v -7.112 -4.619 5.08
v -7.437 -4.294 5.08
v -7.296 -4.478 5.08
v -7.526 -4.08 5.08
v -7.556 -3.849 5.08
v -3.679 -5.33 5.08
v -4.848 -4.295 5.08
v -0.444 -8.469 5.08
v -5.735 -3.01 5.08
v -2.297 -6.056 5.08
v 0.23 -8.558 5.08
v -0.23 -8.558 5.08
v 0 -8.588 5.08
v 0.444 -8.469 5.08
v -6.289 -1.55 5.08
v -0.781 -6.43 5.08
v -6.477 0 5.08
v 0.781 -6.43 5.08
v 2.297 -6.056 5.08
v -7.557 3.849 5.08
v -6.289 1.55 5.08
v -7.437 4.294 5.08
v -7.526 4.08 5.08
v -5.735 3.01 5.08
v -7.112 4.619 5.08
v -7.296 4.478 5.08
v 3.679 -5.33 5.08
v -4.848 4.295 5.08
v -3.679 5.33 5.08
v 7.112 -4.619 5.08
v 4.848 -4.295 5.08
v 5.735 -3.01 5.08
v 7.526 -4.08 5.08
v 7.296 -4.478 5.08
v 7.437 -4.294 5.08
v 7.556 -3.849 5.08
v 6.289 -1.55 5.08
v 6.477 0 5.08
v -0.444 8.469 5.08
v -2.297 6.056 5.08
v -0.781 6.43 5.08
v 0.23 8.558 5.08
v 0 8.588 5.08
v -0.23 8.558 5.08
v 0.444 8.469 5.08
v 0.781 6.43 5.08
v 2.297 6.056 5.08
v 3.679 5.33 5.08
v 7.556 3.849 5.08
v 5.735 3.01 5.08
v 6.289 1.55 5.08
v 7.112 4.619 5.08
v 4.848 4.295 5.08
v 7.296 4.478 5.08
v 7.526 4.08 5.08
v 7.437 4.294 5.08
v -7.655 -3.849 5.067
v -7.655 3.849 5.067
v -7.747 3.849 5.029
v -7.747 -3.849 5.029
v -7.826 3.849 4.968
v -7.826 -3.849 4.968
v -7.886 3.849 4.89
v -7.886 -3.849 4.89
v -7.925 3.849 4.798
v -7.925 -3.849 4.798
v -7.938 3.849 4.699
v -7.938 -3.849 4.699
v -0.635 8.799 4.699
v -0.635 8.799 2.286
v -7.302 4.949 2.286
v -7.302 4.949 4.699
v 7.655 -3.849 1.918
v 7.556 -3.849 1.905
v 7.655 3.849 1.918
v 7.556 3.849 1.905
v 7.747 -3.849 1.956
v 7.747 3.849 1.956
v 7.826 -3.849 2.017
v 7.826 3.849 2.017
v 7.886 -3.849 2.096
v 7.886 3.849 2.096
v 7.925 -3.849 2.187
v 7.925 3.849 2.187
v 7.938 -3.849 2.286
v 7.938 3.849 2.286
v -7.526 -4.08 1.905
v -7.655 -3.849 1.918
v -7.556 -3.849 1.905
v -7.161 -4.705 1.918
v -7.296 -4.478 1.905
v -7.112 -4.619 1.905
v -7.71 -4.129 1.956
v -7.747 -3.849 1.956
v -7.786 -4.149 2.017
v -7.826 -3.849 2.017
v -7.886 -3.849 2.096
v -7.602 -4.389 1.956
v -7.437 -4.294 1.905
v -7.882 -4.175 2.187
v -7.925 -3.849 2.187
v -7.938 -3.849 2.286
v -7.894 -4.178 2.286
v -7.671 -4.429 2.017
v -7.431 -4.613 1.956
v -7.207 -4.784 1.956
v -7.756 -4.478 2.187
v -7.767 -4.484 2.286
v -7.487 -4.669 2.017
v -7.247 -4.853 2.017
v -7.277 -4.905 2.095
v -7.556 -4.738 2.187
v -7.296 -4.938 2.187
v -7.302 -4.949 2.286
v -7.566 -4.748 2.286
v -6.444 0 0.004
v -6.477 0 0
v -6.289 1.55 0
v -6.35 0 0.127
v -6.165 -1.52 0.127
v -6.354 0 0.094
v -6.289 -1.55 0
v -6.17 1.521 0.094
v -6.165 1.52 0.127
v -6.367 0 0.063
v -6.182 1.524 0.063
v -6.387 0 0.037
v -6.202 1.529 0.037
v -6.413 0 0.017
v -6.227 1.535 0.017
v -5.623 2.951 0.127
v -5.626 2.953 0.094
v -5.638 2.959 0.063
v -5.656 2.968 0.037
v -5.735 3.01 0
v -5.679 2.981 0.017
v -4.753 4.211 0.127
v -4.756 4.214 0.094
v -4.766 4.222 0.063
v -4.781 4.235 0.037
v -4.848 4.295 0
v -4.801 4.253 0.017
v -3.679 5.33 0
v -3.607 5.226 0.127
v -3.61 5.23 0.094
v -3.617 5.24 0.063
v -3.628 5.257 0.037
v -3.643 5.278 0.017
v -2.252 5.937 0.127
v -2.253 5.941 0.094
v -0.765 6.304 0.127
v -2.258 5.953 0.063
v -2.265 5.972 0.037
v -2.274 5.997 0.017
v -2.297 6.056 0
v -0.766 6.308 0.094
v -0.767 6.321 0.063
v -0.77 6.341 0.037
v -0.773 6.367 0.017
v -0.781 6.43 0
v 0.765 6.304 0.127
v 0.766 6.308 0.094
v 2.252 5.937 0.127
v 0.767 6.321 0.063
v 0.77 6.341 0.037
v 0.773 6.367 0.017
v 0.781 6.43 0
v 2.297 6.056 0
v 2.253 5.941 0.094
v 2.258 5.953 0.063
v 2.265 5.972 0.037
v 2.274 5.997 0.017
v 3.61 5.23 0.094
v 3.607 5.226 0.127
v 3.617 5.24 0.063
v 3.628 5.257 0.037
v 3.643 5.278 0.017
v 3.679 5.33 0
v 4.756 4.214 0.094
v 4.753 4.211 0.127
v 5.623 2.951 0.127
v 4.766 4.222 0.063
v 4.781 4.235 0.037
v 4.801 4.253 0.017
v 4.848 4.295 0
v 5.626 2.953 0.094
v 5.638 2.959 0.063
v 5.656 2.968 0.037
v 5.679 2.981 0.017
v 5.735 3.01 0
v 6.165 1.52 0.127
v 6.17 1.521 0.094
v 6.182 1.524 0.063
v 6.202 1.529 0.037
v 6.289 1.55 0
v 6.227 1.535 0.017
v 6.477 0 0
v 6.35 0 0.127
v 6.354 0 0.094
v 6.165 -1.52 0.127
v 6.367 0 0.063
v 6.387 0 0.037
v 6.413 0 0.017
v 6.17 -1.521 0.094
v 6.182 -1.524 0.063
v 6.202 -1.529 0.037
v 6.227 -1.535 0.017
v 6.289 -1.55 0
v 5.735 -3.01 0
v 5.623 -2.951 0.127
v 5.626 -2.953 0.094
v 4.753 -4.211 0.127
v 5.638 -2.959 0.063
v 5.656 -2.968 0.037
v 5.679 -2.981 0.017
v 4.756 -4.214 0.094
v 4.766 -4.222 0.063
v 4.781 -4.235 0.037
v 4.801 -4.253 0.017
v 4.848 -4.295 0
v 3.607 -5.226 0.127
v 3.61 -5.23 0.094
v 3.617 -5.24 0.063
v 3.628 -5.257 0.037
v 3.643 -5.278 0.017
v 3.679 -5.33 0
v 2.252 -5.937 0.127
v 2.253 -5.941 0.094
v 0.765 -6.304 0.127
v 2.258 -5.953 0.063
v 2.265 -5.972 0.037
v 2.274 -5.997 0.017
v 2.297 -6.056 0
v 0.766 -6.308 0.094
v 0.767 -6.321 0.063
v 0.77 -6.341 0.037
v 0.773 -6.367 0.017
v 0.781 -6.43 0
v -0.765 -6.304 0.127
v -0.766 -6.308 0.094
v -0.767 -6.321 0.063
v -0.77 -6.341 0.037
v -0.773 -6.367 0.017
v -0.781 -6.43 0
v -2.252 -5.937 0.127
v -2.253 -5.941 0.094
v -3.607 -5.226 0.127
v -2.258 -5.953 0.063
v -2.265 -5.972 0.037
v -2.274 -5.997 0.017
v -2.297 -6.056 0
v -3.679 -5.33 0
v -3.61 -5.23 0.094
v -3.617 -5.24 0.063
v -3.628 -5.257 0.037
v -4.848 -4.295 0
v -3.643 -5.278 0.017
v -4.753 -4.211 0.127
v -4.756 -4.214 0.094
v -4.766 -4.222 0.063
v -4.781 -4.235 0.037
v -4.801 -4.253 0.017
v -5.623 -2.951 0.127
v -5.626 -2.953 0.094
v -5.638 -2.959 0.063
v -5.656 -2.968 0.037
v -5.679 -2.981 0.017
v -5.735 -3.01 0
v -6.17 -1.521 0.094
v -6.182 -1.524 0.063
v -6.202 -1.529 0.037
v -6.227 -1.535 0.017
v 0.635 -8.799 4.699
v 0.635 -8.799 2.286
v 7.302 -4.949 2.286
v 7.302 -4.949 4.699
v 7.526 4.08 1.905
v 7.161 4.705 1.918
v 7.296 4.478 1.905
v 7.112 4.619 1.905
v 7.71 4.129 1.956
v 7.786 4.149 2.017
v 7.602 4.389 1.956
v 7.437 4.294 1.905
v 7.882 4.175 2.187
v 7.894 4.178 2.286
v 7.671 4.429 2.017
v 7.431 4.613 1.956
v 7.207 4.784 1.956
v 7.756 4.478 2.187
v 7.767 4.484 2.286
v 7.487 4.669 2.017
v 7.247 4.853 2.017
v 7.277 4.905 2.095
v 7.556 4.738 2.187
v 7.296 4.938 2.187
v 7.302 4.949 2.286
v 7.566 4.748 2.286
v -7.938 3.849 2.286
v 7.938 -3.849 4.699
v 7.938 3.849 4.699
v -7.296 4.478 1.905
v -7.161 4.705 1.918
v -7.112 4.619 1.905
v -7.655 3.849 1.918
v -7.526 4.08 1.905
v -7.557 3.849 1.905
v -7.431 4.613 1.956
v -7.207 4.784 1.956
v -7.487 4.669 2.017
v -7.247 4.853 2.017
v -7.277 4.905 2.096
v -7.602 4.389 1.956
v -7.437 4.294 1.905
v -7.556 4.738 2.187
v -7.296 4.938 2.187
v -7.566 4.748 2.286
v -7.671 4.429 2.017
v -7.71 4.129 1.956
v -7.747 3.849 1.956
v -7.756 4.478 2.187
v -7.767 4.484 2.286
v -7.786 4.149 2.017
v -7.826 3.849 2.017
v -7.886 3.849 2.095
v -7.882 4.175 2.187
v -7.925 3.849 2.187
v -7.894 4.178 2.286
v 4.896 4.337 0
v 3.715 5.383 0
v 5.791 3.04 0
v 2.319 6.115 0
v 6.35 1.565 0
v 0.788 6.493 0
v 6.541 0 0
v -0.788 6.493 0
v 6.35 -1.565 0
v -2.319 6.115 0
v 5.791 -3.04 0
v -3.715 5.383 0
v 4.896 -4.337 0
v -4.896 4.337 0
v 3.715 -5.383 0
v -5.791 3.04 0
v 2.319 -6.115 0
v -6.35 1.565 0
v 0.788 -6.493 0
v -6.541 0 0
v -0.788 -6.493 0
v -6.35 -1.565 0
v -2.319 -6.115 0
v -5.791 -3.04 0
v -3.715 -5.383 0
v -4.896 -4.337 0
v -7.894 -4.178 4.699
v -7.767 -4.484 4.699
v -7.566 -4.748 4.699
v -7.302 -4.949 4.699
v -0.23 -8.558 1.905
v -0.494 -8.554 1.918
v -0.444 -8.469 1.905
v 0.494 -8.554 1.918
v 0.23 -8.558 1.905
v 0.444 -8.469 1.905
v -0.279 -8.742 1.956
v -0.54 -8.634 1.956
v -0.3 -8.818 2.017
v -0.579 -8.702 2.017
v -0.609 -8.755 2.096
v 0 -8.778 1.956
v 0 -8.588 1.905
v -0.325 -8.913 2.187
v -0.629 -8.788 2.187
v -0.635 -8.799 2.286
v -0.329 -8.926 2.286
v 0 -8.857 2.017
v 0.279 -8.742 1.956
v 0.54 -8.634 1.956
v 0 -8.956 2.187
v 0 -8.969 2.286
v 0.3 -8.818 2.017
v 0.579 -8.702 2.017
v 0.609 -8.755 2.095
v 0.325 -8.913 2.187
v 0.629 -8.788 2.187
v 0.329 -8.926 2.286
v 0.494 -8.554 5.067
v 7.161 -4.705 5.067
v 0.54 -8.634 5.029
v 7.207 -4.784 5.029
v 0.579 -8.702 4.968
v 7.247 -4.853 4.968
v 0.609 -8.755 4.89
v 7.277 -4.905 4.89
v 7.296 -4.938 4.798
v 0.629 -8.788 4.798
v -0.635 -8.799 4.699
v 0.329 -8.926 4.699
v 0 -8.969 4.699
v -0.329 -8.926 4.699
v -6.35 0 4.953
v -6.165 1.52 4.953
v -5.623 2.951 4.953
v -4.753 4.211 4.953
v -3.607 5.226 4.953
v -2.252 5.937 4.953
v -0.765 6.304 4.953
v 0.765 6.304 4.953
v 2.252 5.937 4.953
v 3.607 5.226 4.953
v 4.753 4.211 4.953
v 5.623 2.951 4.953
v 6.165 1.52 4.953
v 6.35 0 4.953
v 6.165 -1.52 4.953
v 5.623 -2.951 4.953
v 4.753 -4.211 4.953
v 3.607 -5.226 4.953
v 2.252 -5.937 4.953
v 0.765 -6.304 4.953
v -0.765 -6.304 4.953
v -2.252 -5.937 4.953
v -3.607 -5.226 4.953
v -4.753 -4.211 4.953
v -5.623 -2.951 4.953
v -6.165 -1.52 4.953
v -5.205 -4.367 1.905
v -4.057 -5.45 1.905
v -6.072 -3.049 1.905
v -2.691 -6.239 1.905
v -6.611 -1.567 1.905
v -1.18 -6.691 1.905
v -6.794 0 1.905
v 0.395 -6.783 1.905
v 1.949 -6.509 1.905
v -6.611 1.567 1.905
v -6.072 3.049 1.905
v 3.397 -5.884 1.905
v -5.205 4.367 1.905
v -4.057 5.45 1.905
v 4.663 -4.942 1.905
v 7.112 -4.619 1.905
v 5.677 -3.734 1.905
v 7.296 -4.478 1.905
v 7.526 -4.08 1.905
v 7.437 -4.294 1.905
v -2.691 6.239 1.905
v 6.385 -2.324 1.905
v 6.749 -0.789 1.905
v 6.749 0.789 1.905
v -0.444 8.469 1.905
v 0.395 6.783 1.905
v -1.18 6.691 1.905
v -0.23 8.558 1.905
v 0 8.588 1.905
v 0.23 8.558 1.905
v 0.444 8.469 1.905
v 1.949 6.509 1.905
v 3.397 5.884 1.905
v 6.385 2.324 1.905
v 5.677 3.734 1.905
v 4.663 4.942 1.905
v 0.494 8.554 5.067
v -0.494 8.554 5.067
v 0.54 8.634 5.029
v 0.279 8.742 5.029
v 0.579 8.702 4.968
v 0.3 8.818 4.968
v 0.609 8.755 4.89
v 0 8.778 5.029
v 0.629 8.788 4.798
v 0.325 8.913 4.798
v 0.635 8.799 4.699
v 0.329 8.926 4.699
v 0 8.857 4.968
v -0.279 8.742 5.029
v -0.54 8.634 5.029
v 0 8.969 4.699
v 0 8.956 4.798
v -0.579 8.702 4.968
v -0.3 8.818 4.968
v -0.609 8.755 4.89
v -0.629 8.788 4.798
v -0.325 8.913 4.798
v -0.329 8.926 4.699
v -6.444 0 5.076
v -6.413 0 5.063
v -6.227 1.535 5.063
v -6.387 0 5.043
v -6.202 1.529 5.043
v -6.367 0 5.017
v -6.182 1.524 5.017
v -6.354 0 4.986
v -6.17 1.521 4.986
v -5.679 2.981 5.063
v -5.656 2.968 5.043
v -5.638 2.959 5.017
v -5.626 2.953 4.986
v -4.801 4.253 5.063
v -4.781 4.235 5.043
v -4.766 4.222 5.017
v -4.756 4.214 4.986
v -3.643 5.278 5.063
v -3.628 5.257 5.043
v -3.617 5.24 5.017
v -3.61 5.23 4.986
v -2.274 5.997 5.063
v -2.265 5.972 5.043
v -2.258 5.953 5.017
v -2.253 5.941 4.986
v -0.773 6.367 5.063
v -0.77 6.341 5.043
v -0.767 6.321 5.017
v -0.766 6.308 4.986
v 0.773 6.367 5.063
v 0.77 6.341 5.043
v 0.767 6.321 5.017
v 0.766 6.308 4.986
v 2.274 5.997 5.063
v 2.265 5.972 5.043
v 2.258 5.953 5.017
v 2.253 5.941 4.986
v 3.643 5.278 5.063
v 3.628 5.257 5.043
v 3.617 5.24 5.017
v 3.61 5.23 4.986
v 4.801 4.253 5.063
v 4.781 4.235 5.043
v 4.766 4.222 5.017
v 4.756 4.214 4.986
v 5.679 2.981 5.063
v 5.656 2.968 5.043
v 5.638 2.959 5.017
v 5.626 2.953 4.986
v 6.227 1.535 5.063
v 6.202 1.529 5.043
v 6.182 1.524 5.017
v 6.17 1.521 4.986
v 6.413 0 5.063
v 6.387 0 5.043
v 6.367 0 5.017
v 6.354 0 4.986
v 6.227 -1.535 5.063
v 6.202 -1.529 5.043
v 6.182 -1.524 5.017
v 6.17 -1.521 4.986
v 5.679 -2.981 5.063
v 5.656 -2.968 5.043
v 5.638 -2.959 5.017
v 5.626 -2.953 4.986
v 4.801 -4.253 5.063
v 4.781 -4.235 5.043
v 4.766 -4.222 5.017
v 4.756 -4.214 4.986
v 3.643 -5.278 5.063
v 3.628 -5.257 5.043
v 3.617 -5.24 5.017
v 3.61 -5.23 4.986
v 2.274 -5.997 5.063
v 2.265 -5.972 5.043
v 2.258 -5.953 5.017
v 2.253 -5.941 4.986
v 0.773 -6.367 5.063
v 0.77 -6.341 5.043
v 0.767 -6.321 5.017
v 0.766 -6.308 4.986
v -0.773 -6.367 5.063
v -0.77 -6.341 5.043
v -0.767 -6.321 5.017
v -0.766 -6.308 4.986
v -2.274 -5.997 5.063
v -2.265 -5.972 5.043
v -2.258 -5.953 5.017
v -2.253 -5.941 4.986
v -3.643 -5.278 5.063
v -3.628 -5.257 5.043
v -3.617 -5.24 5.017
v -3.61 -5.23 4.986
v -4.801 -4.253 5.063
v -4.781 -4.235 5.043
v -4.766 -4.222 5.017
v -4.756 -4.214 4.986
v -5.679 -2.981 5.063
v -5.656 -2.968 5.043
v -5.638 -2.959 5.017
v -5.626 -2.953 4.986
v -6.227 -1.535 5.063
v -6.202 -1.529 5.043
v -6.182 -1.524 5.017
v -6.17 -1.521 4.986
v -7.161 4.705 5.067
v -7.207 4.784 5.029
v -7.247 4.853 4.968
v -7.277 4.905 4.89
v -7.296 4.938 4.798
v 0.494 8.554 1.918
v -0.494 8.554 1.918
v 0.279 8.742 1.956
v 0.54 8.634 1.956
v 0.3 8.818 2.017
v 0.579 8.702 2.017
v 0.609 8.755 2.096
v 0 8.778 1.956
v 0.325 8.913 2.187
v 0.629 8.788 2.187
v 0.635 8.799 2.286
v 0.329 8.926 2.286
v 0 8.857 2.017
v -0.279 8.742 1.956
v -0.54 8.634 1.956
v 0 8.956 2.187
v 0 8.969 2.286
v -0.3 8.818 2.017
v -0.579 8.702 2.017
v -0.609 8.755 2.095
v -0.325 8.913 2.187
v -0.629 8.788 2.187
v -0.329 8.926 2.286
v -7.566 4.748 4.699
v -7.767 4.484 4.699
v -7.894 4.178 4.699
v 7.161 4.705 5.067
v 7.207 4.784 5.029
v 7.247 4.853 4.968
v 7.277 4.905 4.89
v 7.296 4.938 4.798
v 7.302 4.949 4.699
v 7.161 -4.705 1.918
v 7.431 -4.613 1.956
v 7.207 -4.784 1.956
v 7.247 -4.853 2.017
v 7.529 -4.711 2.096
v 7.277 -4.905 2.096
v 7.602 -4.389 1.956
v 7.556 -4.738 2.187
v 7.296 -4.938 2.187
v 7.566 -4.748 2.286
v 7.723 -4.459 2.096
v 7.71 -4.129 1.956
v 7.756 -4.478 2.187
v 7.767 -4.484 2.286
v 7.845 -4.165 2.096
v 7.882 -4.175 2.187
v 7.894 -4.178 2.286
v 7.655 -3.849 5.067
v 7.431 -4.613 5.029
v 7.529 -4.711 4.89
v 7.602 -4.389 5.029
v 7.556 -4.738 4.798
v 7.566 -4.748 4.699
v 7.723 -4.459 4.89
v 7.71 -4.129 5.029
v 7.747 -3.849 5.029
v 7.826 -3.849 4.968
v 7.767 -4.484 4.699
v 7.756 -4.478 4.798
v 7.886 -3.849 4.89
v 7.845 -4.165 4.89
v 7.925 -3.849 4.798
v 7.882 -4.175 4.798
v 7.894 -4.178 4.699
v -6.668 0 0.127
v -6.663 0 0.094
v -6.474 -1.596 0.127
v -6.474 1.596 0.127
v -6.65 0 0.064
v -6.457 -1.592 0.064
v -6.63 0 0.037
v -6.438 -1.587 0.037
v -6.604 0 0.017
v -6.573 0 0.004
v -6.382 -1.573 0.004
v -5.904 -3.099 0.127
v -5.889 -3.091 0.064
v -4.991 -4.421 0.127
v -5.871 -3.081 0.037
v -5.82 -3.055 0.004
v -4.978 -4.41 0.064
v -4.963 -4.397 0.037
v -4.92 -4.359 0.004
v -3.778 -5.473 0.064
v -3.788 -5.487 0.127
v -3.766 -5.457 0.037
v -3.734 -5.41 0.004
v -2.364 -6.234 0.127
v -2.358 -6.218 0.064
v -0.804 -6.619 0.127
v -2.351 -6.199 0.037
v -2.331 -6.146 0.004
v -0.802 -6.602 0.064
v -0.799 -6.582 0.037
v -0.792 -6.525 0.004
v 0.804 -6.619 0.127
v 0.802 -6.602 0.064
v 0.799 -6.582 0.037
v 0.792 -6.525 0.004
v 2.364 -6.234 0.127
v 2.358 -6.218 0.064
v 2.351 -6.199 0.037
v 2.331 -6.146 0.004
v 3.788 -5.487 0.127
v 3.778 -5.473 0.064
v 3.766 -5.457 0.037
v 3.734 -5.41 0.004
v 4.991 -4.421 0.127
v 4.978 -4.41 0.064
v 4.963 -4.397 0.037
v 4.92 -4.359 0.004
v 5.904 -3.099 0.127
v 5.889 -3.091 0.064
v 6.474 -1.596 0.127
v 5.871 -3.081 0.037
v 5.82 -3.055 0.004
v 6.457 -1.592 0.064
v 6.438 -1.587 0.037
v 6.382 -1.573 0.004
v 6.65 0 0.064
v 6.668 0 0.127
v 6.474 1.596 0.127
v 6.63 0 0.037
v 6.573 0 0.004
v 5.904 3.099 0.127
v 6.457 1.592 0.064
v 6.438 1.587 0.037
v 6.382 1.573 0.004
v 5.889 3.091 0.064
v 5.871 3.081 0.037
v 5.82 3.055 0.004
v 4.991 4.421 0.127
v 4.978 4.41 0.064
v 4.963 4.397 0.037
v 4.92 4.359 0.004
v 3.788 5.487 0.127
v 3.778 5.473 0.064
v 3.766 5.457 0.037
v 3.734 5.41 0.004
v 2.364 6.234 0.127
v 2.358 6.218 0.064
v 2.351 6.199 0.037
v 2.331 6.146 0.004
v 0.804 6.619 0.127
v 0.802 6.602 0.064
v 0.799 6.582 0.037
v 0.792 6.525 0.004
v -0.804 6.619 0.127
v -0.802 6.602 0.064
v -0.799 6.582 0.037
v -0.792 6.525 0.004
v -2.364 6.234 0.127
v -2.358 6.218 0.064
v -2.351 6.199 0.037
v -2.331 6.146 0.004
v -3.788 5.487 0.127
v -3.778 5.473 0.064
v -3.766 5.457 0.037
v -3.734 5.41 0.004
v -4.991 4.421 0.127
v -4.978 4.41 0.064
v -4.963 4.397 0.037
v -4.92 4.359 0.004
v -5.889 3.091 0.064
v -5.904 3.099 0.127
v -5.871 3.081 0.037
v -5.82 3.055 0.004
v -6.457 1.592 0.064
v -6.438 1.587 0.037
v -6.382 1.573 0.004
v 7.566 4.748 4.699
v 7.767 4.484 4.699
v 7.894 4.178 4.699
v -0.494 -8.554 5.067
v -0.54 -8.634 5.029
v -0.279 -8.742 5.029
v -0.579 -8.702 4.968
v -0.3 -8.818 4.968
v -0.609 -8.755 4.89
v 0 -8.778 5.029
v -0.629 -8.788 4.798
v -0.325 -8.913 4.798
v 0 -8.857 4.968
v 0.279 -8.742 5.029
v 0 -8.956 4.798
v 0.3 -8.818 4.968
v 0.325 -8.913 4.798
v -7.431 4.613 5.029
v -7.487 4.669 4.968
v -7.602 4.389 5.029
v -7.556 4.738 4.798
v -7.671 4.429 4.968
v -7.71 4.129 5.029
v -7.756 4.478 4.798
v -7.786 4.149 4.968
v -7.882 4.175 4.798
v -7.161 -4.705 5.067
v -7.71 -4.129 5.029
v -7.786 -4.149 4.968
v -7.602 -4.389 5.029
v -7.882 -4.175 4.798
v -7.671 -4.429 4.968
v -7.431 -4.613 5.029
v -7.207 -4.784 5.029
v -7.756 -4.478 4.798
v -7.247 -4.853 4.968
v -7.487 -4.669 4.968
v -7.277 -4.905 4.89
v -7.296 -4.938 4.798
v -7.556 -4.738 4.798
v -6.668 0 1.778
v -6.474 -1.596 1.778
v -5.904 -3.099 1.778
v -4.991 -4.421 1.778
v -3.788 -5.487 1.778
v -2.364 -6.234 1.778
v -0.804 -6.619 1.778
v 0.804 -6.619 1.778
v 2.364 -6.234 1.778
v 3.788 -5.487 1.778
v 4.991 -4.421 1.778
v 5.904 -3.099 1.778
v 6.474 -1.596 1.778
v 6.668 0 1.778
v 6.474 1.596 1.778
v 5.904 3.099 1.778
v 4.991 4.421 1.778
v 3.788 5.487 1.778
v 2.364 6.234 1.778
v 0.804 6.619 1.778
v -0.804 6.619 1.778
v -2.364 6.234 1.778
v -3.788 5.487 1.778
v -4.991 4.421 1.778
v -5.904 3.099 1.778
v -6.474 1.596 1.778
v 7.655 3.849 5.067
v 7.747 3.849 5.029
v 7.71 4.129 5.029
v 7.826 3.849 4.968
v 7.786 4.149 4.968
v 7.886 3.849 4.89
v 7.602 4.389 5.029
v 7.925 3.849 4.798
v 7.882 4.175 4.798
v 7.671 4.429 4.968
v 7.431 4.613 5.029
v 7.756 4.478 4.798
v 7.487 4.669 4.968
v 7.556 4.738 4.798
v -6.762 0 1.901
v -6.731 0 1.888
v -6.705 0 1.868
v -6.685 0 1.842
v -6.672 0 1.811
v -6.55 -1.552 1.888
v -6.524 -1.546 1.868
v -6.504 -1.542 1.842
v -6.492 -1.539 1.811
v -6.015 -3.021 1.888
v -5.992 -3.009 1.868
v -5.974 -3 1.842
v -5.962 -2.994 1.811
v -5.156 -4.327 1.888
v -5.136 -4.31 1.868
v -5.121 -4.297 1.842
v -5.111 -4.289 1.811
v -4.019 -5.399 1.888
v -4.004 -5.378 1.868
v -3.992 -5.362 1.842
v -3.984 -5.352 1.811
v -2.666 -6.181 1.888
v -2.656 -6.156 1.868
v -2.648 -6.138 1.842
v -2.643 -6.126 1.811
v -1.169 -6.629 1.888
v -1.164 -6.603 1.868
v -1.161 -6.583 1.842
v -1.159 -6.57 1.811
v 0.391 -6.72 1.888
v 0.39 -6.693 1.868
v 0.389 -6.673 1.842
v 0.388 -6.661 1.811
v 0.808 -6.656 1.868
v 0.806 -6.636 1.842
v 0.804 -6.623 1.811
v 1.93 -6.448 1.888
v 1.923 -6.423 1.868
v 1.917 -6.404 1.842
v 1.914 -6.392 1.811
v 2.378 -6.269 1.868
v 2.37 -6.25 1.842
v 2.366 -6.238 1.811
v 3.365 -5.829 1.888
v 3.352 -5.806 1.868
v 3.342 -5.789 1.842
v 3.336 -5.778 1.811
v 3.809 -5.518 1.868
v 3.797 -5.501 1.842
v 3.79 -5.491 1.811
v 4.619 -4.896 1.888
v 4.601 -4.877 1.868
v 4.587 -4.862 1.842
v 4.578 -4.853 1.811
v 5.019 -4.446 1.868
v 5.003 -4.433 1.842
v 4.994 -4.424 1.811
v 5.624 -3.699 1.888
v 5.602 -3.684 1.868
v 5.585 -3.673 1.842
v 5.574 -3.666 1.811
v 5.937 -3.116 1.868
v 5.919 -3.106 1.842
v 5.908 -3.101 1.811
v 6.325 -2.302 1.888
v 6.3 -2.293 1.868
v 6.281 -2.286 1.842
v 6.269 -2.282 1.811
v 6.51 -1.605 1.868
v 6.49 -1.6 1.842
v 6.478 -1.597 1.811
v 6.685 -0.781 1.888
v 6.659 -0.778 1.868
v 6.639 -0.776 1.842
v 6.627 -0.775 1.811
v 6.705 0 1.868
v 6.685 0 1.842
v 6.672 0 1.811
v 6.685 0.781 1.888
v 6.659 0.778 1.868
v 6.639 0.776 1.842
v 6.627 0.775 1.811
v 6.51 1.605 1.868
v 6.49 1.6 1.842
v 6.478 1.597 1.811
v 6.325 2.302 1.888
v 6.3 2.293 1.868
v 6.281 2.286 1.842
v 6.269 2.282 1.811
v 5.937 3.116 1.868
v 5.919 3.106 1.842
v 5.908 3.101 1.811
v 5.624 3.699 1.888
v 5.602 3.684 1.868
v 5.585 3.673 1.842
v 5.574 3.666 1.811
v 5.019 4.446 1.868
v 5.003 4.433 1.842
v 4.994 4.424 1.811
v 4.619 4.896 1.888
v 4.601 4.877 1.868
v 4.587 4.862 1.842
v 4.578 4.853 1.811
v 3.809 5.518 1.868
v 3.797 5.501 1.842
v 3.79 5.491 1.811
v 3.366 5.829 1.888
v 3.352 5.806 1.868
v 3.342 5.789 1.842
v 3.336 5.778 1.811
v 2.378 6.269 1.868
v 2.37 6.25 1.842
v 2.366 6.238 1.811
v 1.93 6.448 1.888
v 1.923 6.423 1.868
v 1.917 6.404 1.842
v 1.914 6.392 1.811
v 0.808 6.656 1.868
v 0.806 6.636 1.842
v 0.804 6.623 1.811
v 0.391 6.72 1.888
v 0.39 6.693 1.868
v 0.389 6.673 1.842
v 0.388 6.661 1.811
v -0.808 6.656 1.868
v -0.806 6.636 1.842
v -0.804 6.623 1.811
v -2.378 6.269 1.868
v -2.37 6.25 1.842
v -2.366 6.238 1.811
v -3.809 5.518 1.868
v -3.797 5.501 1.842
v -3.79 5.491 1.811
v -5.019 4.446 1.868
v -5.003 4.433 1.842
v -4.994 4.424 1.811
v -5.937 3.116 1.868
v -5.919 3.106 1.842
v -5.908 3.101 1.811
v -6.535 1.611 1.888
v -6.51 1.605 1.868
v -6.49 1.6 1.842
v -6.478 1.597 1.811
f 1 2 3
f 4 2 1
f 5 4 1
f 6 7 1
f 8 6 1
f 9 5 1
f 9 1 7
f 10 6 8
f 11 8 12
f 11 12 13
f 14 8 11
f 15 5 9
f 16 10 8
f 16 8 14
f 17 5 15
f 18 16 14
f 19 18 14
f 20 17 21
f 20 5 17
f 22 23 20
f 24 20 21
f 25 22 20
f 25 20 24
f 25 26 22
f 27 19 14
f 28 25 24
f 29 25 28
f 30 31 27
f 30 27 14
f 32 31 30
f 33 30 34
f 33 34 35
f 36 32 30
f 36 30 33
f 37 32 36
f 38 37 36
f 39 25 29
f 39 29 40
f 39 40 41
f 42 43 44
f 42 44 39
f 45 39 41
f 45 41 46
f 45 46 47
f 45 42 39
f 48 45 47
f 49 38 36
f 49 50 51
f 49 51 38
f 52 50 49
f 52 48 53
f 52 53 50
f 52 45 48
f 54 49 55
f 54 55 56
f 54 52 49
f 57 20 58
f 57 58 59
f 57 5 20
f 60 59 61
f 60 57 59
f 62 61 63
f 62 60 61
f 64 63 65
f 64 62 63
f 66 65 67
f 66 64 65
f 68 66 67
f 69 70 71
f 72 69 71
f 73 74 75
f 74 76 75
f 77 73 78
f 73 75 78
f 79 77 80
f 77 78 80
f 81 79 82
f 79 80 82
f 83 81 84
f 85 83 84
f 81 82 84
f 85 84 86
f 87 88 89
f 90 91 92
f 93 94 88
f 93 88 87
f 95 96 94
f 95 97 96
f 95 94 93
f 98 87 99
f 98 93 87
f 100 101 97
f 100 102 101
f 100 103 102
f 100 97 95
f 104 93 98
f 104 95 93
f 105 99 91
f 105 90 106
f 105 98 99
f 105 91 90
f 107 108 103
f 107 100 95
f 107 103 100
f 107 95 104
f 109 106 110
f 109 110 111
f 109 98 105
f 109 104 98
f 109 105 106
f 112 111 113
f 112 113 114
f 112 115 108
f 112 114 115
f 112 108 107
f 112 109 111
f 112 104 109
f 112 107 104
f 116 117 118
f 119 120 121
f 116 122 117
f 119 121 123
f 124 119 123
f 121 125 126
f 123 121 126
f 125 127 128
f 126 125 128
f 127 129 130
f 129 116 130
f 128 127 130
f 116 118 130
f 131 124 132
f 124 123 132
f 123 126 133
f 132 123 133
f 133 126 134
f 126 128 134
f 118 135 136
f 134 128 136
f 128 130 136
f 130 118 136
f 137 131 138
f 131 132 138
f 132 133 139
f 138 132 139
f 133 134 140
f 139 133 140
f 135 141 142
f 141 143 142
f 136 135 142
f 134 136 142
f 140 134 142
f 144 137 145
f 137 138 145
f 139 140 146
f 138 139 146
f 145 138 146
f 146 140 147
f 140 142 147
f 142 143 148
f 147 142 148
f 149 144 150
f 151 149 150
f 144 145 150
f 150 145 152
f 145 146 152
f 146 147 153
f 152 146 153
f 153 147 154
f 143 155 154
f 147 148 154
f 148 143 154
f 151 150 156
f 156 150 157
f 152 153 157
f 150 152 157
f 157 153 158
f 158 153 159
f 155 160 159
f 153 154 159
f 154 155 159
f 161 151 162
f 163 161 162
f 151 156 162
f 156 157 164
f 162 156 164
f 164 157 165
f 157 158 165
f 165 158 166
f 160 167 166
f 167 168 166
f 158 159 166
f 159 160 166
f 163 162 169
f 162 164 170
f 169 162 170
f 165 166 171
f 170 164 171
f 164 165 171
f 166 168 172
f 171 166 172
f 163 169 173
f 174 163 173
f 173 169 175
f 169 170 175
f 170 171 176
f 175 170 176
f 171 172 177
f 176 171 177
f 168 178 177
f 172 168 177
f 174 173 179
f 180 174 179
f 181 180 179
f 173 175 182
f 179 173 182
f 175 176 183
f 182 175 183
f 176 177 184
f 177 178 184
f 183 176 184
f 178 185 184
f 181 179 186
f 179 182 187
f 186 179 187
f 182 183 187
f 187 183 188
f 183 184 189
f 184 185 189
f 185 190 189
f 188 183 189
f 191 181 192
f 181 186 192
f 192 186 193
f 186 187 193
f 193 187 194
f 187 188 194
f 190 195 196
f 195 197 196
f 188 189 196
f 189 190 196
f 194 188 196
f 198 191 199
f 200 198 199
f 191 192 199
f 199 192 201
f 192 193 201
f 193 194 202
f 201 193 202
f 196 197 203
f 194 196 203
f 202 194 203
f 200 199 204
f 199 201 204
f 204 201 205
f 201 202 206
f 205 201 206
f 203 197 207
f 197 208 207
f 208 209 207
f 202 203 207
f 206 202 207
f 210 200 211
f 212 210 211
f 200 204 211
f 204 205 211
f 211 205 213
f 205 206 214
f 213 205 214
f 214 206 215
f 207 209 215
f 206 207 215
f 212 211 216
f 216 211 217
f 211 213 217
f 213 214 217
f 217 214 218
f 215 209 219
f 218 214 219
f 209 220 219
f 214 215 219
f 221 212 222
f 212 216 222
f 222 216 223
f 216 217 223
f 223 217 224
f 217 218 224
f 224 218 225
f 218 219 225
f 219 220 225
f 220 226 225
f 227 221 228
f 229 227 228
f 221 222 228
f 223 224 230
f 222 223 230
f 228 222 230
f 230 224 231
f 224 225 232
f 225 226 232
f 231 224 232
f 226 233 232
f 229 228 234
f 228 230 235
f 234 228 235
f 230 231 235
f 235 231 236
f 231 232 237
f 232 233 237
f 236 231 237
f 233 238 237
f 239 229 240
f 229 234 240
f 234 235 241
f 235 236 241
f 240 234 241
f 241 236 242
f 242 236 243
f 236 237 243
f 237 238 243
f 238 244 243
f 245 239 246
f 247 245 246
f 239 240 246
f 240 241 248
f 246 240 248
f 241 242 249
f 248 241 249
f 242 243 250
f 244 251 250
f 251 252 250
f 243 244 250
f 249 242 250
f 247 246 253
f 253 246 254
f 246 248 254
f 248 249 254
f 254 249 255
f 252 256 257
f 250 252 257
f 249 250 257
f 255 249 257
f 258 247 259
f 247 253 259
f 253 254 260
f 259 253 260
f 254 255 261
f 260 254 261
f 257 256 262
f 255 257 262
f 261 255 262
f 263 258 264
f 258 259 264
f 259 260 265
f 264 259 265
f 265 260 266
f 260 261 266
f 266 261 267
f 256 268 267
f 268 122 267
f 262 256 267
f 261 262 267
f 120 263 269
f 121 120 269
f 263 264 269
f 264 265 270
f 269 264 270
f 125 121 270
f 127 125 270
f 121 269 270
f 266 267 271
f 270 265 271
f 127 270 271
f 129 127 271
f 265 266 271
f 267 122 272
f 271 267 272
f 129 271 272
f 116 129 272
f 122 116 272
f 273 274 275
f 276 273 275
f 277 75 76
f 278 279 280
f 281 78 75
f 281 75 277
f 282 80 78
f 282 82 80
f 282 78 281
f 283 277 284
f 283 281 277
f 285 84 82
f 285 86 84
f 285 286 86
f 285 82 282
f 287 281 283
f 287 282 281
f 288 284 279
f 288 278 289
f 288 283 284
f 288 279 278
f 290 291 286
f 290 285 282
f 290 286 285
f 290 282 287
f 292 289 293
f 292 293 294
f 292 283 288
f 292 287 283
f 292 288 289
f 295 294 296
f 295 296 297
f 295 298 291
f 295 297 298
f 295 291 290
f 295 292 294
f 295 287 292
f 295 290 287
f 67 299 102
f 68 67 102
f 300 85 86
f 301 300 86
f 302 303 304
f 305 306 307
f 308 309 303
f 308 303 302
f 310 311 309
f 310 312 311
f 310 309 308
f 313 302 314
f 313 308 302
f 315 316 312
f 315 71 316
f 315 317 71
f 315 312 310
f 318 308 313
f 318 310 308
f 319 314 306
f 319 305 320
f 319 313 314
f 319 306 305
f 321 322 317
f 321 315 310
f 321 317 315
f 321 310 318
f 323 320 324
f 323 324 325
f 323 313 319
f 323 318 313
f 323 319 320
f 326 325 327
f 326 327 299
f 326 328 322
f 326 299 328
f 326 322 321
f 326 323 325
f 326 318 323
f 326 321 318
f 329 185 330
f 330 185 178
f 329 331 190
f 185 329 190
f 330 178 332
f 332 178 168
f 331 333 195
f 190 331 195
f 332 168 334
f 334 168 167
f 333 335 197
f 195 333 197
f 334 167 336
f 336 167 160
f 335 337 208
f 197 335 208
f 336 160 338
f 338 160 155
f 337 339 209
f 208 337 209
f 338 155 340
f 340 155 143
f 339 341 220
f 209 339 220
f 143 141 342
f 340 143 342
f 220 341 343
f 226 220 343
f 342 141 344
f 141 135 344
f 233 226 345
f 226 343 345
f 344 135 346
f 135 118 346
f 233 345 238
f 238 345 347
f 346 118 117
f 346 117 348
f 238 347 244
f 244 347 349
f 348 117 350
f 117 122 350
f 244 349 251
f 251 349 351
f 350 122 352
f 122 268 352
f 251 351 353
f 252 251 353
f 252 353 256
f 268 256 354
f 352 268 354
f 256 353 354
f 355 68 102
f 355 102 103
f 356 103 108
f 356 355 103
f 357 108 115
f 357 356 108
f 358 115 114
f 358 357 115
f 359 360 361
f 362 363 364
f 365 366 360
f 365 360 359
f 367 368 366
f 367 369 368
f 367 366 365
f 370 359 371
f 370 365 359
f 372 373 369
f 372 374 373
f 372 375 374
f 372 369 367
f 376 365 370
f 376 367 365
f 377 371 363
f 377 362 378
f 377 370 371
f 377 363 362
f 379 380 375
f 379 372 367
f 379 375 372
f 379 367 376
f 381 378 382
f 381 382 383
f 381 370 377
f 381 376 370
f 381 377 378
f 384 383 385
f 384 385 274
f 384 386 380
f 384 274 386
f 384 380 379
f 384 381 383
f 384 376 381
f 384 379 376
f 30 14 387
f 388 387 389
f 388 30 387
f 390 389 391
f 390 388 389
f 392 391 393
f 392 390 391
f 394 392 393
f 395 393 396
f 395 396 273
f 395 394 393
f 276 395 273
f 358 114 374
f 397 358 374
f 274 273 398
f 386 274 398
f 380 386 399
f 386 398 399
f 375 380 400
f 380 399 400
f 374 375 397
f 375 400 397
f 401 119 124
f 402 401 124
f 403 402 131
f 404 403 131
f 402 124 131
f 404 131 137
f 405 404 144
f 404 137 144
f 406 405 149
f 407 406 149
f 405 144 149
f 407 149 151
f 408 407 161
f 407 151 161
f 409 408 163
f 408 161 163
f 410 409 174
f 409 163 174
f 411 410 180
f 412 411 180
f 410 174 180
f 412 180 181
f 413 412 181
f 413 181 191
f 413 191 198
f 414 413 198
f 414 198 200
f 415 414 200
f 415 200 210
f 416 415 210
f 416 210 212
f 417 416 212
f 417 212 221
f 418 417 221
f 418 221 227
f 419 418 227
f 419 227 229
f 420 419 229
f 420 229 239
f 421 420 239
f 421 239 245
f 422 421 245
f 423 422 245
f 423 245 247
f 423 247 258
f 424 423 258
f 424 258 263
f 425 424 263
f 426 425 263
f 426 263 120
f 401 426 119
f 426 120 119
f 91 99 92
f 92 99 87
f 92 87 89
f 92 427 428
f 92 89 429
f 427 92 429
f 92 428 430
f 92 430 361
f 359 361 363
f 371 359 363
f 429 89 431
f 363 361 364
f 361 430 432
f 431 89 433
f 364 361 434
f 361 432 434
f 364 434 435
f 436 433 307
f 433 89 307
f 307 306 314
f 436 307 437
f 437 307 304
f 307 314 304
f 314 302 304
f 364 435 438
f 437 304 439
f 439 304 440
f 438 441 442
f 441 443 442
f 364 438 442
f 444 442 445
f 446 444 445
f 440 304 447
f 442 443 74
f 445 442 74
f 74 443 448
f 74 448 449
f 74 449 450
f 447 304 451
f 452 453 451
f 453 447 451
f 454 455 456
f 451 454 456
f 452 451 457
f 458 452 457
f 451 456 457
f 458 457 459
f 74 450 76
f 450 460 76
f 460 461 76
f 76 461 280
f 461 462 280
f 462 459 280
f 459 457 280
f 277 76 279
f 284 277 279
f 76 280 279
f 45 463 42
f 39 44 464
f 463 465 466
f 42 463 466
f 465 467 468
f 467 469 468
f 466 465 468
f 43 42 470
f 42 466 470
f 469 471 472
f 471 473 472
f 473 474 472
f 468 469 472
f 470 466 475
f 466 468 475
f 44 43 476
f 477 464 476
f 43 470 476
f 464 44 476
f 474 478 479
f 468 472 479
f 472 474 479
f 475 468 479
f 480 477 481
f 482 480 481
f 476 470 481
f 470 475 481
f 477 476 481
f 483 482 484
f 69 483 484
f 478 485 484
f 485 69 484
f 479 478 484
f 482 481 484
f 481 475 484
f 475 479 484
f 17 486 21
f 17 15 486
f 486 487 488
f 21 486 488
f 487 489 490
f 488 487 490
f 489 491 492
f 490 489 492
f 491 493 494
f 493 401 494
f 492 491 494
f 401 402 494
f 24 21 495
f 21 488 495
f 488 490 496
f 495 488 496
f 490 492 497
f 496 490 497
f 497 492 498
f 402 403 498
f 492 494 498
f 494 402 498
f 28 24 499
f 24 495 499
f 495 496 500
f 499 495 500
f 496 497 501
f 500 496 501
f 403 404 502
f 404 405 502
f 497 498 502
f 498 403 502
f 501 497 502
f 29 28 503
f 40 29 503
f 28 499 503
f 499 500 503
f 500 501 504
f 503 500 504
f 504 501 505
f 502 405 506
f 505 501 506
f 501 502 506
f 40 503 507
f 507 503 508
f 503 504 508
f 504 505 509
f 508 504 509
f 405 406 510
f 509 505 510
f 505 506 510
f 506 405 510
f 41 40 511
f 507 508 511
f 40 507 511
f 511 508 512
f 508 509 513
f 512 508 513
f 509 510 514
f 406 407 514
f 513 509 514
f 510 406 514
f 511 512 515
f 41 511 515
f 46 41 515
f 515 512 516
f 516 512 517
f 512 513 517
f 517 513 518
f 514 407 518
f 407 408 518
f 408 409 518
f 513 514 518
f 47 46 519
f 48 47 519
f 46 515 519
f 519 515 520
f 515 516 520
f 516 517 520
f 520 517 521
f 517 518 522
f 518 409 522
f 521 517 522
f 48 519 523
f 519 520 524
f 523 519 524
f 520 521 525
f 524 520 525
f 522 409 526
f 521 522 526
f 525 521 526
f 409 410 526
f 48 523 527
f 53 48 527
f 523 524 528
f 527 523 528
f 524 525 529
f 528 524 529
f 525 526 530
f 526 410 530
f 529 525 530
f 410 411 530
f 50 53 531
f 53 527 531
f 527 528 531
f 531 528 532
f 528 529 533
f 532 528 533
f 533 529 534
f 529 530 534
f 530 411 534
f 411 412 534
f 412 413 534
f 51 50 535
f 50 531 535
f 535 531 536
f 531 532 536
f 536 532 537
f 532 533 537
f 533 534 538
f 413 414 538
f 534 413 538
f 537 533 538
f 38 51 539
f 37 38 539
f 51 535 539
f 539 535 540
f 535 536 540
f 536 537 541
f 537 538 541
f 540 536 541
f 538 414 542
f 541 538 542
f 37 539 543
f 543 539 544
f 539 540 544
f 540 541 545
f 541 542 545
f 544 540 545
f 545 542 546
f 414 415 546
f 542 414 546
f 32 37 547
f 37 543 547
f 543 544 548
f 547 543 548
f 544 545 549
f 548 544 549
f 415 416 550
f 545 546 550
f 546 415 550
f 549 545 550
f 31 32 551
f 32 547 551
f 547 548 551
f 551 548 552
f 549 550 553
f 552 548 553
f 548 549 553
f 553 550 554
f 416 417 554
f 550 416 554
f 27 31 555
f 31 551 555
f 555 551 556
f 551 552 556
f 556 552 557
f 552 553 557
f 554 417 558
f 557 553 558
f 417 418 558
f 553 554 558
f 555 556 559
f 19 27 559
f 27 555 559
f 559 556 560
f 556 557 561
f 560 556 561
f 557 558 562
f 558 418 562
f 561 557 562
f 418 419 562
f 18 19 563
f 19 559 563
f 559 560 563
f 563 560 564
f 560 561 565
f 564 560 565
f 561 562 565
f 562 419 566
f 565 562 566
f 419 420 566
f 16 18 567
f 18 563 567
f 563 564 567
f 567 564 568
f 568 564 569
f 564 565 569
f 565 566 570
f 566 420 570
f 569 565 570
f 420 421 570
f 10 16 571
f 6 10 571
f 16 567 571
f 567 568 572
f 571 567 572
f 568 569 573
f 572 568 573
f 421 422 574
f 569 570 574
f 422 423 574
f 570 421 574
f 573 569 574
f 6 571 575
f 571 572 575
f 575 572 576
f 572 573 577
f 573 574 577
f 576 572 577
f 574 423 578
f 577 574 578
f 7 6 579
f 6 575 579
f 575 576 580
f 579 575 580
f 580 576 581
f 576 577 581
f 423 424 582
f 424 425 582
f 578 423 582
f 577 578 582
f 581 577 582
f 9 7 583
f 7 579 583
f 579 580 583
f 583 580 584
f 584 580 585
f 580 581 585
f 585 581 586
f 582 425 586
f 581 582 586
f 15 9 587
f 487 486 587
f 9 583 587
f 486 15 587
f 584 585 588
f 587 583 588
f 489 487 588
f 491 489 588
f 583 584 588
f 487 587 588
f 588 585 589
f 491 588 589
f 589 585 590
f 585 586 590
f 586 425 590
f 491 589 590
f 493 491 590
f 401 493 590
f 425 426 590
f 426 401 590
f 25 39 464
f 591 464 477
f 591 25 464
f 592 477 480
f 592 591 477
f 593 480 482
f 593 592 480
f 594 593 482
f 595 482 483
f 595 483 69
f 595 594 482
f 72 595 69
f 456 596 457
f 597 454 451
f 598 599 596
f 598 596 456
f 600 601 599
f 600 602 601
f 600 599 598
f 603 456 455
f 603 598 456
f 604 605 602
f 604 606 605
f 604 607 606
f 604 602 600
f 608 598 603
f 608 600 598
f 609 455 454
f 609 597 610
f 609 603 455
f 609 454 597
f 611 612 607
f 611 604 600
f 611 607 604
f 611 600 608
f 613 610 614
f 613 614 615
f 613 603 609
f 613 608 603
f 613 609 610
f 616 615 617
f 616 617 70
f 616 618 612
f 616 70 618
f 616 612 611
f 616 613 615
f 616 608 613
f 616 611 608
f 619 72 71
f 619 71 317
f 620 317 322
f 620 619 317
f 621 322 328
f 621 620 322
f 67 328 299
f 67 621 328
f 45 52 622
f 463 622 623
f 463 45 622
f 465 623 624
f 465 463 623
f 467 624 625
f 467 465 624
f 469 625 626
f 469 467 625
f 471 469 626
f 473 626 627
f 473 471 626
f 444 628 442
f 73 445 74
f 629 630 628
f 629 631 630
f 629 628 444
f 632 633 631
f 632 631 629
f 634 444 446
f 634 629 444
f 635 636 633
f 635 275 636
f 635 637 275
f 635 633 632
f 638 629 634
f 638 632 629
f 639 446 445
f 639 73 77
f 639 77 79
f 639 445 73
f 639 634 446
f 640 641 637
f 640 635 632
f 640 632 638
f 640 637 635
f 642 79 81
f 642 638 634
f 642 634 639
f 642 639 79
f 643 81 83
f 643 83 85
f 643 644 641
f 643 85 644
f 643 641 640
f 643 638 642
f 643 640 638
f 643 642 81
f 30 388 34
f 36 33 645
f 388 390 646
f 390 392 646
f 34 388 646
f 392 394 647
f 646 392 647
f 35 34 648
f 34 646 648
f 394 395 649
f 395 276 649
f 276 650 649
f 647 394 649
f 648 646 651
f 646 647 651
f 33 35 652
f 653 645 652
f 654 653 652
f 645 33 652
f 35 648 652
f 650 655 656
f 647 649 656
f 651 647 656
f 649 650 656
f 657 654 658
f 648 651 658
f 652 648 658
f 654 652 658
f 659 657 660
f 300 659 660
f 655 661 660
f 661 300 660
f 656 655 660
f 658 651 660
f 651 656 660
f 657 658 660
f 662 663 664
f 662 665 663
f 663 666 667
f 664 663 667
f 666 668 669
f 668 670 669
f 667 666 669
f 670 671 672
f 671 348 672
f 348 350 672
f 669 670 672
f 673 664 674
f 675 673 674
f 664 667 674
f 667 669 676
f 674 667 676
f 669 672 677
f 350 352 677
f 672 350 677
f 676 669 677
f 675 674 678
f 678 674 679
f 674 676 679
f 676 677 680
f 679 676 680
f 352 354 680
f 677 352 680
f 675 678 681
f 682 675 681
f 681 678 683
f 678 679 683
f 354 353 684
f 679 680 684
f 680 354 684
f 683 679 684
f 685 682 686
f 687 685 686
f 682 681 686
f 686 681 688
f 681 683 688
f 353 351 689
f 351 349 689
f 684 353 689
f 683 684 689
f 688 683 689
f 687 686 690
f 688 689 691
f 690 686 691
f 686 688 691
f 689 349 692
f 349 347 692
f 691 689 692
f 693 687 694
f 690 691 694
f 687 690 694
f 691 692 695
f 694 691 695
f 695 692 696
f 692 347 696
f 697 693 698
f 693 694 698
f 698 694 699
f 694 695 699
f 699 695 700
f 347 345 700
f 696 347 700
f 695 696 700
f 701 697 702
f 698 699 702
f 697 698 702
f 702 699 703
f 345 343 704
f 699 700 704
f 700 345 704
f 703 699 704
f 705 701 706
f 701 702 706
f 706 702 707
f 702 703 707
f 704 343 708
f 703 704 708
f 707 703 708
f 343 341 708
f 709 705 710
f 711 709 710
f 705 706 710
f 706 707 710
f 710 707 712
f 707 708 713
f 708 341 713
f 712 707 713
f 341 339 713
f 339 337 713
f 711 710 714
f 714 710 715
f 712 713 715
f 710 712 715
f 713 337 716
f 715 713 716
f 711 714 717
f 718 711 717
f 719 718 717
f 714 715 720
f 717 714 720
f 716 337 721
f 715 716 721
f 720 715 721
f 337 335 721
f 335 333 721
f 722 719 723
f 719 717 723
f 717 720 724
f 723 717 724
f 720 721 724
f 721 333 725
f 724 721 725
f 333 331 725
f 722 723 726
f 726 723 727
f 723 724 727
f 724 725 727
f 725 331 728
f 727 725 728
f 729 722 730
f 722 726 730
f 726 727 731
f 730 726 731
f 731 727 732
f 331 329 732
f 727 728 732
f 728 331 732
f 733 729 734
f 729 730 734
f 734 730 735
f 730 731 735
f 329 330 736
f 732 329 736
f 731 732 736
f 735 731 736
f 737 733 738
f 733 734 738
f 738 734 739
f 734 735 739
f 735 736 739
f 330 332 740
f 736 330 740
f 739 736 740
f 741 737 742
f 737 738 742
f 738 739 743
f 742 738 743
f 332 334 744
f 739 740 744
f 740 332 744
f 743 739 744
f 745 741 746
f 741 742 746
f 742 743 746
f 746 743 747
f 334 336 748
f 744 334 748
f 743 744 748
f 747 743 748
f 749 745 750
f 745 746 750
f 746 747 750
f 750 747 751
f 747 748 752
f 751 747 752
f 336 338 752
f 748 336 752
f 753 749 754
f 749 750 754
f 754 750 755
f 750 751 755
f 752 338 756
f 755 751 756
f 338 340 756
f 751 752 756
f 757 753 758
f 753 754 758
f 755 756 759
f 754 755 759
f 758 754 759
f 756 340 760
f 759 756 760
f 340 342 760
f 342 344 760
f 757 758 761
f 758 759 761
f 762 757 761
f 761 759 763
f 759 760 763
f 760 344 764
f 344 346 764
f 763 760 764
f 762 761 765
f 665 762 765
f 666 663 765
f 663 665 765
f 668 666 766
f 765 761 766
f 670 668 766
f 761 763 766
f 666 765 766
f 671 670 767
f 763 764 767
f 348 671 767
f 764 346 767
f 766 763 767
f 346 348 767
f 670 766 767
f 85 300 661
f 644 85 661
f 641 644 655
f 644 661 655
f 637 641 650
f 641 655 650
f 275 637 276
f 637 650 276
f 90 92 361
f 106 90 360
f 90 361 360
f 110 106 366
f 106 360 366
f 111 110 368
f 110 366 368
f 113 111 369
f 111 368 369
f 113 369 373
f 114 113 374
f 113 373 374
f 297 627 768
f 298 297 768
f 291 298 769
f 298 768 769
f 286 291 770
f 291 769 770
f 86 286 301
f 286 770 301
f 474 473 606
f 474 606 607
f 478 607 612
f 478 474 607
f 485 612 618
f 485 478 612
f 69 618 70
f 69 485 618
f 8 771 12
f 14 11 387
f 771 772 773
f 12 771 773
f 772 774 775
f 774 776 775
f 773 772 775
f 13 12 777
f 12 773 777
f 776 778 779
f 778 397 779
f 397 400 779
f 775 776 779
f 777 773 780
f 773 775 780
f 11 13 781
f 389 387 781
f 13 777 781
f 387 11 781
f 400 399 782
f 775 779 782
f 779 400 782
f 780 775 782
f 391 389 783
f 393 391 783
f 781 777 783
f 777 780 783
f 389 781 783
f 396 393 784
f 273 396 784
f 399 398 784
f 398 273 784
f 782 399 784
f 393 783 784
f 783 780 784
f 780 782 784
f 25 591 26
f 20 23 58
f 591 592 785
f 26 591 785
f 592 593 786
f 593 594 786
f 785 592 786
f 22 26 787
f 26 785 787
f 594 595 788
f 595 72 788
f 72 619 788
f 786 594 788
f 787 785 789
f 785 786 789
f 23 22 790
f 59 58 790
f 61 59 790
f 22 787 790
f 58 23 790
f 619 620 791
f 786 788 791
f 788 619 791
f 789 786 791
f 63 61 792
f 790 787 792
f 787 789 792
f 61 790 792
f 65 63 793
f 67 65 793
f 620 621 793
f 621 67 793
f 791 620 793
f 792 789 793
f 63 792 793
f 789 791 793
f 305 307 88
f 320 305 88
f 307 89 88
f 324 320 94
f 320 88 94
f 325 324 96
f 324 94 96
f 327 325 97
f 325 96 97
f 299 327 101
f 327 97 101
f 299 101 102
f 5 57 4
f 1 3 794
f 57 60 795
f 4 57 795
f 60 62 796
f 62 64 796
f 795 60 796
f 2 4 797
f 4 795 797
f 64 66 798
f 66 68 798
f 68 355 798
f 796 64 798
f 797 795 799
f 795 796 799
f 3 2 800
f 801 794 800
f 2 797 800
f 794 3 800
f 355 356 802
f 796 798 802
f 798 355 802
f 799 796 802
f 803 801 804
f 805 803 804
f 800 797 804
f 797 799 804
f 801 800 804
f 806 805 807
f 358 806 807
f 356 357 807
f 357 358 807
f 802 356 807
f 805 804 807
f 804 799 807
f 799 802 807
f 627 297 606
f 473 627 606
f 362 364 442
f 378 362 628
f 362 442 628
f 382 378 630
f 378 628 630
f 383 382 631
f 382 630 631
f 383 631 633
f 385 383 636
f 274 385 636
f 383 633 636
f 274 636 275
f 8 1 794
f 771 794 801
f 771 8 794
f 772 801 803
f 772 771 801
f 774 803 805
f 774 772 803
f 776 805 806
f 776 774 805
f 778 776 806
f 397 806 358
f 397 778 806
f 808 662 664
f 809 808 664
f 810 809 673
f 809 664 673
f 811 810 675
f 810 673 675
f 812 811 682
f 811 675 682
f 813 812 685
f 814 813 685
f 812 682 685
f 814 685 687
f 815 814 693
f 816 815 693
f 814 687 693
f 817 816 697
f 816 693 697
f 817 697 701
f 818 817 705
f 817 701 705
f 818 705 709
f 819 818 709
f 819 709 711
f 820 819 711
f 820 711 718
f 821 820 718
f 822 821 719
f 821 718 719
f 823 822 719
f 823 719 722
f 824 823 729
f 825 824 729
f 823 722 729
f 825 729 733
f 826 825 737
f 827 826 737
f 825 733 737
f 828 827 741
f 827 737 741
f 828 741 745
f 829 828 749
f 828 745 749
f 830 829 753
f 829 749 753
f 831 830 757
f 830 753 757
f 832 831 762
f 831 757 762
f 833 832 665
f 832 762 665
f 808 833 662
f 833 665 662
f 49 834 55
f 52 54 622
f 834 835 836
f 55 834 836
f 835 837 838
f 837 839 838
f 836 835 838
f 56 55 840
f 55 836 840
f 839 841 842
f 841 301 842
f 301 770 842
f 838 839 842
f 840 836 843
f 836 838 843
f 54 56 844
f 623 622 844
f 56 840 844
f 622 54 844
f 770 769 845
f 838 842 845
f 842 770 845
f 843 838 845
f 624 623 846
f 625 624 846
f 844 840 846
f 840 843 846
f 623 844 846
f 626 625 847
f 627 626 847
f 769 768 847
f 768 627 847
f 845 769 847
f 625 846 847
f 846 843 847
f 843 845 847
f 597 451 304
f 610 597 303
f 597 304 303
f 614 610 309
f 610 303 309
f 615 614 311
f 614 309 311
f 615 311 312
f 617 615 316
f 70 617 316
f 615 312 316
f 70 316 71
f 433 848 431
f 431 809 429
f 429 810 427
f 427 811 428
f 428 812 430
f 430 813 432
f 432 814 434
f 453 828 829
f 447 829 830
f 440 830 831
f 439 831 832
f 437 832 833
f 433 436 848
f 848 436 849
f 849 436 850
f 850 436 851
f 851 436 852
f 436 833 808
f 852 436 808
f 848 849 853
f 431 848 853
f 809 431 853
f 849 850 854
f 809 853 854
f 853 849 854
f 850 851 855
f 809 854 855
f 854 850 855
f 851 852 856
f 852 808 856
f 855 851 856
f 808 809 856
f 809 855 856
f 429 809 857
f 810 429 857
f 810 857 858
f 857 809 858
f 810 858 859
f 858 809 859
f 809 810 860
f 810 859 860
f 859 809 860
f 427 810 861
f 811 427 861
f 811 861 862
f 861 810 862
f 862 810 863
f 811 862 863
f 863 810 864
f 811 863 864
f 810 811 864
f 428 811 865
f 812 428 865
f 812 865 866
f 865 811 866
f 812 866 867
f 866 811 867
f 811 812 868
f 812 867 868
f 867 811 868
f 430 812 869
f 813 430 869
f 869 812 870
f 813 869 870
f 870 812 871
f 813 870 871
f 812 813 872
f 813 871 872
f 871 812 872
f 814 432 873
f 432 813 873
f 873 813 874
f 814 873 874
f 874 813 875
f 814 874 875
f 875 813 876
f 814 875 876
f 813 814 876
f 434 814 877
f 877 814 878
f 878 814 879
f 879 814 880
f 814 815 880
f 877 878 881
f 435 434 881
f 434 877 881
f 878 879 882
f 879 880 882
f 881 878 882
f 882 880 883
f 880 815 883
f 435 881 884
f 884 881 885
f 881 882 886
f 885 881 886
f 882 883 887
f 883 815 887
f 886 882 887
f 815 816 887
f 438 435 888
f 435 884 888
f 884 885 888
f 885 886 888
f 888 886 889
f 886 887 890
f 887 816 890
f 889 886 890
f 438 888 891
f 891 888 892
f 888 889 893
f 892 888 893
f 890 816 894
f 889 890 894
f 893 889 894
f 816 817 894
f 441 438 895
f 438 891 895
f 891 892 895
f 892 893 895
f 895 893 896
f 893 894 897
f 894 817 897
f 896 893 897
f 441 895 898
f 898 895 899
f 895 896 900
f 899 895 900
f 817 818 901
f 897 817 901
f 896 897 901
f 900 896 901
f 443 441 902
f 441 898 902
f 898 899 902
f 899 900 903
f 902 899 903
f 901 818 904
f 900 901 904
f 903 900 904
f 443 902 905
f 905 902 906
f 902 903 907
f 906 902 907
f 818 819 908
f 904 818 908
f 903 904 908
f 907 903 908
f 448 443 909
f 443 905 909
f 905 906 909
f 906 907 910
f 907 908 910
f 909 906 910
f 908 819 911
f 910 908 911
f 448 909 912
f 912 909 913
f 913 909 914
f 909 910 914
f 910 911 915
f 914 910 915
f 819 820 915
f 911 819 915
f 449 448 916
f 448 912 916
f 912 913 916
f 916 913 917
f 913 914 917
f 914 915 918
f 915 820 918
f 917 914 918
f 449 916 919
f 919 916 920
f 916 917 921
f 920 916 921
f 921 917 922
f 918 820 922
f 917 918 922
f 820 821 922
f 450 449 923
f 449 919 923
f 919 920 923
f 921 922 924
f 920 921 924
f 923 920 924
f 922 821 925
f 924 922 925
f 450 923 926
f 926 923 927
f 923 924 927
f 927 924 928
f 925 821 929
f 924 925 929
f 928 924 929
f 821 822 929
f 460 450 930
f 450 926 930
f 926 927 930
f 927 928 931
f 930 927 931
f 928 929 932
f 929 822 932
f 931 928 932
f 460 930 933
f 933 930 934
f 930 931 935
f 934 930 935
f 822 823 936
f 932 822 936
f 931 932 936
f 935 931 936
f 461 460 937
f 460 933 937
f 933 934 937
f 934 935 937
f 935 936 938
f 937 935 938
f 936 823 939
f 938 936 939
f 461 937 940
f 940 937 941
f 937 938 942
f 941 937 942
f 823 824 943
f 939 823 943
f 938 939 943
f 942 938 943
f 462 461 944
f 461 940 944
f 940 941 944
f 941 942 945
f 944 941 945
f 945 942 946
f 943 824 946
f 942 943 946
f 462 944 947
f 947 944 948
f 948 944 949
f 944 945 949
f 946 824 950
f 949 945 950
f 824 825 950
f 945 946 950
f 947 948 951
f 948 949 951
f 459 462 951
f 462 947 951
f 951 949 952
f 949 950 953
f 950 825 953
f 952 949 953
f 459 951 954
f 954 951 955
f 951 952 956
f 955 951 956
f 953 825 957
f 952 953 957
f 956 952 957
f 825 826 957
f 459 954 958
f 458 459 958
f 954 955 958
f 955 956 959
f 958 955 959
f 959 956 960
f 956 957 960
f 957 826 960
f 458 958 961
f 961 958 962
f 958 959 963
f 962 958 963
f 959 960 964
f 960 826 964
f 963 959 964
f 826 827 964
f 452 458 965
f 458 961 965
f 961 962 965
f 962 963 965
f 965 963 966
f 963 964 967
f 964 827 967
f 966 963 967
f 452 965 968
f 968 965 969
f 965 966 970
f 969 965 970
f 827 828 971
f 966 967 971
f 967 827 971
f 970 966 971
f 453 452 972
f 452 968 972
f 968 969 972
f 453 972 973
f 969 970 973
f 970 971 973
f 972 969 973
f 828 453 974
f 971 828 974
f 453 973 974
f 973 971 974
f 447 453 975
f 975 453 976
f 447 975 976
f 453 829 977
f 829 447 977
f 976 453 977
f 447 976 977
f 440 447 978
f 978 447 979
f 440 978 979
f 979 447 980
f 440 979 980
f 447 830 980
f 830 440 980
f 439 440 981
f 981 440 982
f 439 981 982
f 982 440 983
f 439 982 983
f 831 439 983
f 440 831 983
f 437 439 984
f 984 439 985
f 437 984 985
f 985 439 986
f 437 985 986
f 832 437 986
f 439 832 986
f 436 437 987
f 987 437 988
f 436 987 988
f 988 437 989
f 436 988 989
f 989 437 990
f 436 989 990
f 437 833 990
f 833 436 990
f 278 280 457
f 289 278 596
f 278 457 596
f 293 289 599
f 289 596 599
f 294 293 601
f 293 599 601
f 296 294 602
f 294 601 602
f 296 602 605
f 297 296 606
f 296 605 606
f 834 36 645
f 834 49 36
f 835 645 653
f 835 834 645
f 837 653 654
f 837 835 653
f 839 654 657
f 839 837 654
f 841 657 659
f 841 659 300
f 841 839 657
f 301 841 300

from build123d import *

# Parameters (mm, degrees)
SKETCH1_R           = 6.6675
BOSS_EXTRUDE1_DEPTH = 1.905
BOSS_EXTRUDE2_DEPTH = 3.175
SKETCH3_R           = 6.35
CUT_EXTRUDE1_DEPTH  = 14.145931484
FILLET1_R           = 1.27
FILLET2_R           = 0.381
FILLET3_R           = 0.127


with BuildPart() as part:
    # Sketch1 → Boss-Extrude1 (new body)
    with BuildSketch(Plane.XY):
        with Locations(Location((0, 0, 0), (0, 0, 180))):
            Circle(SKETCH1_R)
    extrude(amount=BOSS_EXTRUDE1_DEPTH)

    # Sketch2 → Boss-Extrude2 (add)
    with BuildSketch(Plane.XY.offset(1.905)):
        Polygon((7.9375, 4.582717762), (0, 9.165435523), (-7.9375, 4.582717762), (-7.9375, -4.582717762), (0, -9.165435523), (7.9375, -4.582717762), align=None)
    extrude(amount=BOSS_EXTRUDE2_DEPTH)

    # Sketch3 → Cut-Extrude1 (cut, through all)
    with BuildSketch(Plane(origin=(0, 0, 0), x_dir=(-1, 0, 0), z_dir=(0, 0, -1))):
        Circle(SKETCH3_R)
    extrude(amount=-CUT_EXTRUDE1_DEPTH, mode=Mode.SUBTRACT)

    # Fillet1
    fillet1_edges = [part.edges().sort_by_distance(p)[0] for p in [
        (7.9375, -4.582717762, 3.4925),
        (7.9375, 4.582717762, 3.4925),
        (0, 9.165435523, 3.4925),
        (-7.9375, 4.582717762, 3.4925),
        (-7.9375, -4.582717762, 3.4925),
        (0, -9.165435523, 3.4925),
    ]]
    fillet(fillet1_edges, radius=FILLET1_R)

    # Fillet2
    fillet2_edges = [part.edges().sort_by_distance(p)[0] for p in [
        (7.9375, 0, 1.905),
        (7.9375, 0, 5.08),
        (3.96875, -6.874076643, 1.905),
        (-3.96875, -6.874076643, 1.905),
        (-7.9375, 0, 1.905),
        (-3.96875, 6.874076643, 1.905),
        (3.96875, 6.874076643, 1.905),
        (0, 8.96896584, 1.905),
        (7.767352263, 4.48448292, 1.905),
        (-7.767352263, 4.48448292, 1.905),
        (-7.767352263, -4.48448292, 1.905),
        (0, -8.96896584, 1.905),
        (7.767352263, -4.48448292, 1.905),
        (3.96875, -6.874076643, 5.08),
        (3.96875, 6.874076643, 5.08),
        (-3.96875, 6.874076643, 5.08),
        (-7.9375, 0, 5.08),
        (-3.96875, -6.874076643, 5.08),
        (0, 8.96896584, 5.08),
        (7.767352263, 4.48448292, 5.08),
        (-7.767352263, 4.48448292, 5.08),
        (-7.767352263, -4.48448292, 5.08),
        (0, -8.96896584, 5.08),
        (7.767352263, -4.48448292, 5.08),
    ]]
    fillet(fillet2_edges, radius=FILLET2_R)

    # Fillet3
    fillet3_edges = [part.edges().sort_by_distance(p)[0] for p in [
        (6.6675, 0, 0),
        (6.35, 0, 5.08),
        (6.35, 0, 0),
        (6.6675, 0, 1.905),
    ]]
    fillet(fillet3_edges, radius=FILLET3_R)


solid = part.part
